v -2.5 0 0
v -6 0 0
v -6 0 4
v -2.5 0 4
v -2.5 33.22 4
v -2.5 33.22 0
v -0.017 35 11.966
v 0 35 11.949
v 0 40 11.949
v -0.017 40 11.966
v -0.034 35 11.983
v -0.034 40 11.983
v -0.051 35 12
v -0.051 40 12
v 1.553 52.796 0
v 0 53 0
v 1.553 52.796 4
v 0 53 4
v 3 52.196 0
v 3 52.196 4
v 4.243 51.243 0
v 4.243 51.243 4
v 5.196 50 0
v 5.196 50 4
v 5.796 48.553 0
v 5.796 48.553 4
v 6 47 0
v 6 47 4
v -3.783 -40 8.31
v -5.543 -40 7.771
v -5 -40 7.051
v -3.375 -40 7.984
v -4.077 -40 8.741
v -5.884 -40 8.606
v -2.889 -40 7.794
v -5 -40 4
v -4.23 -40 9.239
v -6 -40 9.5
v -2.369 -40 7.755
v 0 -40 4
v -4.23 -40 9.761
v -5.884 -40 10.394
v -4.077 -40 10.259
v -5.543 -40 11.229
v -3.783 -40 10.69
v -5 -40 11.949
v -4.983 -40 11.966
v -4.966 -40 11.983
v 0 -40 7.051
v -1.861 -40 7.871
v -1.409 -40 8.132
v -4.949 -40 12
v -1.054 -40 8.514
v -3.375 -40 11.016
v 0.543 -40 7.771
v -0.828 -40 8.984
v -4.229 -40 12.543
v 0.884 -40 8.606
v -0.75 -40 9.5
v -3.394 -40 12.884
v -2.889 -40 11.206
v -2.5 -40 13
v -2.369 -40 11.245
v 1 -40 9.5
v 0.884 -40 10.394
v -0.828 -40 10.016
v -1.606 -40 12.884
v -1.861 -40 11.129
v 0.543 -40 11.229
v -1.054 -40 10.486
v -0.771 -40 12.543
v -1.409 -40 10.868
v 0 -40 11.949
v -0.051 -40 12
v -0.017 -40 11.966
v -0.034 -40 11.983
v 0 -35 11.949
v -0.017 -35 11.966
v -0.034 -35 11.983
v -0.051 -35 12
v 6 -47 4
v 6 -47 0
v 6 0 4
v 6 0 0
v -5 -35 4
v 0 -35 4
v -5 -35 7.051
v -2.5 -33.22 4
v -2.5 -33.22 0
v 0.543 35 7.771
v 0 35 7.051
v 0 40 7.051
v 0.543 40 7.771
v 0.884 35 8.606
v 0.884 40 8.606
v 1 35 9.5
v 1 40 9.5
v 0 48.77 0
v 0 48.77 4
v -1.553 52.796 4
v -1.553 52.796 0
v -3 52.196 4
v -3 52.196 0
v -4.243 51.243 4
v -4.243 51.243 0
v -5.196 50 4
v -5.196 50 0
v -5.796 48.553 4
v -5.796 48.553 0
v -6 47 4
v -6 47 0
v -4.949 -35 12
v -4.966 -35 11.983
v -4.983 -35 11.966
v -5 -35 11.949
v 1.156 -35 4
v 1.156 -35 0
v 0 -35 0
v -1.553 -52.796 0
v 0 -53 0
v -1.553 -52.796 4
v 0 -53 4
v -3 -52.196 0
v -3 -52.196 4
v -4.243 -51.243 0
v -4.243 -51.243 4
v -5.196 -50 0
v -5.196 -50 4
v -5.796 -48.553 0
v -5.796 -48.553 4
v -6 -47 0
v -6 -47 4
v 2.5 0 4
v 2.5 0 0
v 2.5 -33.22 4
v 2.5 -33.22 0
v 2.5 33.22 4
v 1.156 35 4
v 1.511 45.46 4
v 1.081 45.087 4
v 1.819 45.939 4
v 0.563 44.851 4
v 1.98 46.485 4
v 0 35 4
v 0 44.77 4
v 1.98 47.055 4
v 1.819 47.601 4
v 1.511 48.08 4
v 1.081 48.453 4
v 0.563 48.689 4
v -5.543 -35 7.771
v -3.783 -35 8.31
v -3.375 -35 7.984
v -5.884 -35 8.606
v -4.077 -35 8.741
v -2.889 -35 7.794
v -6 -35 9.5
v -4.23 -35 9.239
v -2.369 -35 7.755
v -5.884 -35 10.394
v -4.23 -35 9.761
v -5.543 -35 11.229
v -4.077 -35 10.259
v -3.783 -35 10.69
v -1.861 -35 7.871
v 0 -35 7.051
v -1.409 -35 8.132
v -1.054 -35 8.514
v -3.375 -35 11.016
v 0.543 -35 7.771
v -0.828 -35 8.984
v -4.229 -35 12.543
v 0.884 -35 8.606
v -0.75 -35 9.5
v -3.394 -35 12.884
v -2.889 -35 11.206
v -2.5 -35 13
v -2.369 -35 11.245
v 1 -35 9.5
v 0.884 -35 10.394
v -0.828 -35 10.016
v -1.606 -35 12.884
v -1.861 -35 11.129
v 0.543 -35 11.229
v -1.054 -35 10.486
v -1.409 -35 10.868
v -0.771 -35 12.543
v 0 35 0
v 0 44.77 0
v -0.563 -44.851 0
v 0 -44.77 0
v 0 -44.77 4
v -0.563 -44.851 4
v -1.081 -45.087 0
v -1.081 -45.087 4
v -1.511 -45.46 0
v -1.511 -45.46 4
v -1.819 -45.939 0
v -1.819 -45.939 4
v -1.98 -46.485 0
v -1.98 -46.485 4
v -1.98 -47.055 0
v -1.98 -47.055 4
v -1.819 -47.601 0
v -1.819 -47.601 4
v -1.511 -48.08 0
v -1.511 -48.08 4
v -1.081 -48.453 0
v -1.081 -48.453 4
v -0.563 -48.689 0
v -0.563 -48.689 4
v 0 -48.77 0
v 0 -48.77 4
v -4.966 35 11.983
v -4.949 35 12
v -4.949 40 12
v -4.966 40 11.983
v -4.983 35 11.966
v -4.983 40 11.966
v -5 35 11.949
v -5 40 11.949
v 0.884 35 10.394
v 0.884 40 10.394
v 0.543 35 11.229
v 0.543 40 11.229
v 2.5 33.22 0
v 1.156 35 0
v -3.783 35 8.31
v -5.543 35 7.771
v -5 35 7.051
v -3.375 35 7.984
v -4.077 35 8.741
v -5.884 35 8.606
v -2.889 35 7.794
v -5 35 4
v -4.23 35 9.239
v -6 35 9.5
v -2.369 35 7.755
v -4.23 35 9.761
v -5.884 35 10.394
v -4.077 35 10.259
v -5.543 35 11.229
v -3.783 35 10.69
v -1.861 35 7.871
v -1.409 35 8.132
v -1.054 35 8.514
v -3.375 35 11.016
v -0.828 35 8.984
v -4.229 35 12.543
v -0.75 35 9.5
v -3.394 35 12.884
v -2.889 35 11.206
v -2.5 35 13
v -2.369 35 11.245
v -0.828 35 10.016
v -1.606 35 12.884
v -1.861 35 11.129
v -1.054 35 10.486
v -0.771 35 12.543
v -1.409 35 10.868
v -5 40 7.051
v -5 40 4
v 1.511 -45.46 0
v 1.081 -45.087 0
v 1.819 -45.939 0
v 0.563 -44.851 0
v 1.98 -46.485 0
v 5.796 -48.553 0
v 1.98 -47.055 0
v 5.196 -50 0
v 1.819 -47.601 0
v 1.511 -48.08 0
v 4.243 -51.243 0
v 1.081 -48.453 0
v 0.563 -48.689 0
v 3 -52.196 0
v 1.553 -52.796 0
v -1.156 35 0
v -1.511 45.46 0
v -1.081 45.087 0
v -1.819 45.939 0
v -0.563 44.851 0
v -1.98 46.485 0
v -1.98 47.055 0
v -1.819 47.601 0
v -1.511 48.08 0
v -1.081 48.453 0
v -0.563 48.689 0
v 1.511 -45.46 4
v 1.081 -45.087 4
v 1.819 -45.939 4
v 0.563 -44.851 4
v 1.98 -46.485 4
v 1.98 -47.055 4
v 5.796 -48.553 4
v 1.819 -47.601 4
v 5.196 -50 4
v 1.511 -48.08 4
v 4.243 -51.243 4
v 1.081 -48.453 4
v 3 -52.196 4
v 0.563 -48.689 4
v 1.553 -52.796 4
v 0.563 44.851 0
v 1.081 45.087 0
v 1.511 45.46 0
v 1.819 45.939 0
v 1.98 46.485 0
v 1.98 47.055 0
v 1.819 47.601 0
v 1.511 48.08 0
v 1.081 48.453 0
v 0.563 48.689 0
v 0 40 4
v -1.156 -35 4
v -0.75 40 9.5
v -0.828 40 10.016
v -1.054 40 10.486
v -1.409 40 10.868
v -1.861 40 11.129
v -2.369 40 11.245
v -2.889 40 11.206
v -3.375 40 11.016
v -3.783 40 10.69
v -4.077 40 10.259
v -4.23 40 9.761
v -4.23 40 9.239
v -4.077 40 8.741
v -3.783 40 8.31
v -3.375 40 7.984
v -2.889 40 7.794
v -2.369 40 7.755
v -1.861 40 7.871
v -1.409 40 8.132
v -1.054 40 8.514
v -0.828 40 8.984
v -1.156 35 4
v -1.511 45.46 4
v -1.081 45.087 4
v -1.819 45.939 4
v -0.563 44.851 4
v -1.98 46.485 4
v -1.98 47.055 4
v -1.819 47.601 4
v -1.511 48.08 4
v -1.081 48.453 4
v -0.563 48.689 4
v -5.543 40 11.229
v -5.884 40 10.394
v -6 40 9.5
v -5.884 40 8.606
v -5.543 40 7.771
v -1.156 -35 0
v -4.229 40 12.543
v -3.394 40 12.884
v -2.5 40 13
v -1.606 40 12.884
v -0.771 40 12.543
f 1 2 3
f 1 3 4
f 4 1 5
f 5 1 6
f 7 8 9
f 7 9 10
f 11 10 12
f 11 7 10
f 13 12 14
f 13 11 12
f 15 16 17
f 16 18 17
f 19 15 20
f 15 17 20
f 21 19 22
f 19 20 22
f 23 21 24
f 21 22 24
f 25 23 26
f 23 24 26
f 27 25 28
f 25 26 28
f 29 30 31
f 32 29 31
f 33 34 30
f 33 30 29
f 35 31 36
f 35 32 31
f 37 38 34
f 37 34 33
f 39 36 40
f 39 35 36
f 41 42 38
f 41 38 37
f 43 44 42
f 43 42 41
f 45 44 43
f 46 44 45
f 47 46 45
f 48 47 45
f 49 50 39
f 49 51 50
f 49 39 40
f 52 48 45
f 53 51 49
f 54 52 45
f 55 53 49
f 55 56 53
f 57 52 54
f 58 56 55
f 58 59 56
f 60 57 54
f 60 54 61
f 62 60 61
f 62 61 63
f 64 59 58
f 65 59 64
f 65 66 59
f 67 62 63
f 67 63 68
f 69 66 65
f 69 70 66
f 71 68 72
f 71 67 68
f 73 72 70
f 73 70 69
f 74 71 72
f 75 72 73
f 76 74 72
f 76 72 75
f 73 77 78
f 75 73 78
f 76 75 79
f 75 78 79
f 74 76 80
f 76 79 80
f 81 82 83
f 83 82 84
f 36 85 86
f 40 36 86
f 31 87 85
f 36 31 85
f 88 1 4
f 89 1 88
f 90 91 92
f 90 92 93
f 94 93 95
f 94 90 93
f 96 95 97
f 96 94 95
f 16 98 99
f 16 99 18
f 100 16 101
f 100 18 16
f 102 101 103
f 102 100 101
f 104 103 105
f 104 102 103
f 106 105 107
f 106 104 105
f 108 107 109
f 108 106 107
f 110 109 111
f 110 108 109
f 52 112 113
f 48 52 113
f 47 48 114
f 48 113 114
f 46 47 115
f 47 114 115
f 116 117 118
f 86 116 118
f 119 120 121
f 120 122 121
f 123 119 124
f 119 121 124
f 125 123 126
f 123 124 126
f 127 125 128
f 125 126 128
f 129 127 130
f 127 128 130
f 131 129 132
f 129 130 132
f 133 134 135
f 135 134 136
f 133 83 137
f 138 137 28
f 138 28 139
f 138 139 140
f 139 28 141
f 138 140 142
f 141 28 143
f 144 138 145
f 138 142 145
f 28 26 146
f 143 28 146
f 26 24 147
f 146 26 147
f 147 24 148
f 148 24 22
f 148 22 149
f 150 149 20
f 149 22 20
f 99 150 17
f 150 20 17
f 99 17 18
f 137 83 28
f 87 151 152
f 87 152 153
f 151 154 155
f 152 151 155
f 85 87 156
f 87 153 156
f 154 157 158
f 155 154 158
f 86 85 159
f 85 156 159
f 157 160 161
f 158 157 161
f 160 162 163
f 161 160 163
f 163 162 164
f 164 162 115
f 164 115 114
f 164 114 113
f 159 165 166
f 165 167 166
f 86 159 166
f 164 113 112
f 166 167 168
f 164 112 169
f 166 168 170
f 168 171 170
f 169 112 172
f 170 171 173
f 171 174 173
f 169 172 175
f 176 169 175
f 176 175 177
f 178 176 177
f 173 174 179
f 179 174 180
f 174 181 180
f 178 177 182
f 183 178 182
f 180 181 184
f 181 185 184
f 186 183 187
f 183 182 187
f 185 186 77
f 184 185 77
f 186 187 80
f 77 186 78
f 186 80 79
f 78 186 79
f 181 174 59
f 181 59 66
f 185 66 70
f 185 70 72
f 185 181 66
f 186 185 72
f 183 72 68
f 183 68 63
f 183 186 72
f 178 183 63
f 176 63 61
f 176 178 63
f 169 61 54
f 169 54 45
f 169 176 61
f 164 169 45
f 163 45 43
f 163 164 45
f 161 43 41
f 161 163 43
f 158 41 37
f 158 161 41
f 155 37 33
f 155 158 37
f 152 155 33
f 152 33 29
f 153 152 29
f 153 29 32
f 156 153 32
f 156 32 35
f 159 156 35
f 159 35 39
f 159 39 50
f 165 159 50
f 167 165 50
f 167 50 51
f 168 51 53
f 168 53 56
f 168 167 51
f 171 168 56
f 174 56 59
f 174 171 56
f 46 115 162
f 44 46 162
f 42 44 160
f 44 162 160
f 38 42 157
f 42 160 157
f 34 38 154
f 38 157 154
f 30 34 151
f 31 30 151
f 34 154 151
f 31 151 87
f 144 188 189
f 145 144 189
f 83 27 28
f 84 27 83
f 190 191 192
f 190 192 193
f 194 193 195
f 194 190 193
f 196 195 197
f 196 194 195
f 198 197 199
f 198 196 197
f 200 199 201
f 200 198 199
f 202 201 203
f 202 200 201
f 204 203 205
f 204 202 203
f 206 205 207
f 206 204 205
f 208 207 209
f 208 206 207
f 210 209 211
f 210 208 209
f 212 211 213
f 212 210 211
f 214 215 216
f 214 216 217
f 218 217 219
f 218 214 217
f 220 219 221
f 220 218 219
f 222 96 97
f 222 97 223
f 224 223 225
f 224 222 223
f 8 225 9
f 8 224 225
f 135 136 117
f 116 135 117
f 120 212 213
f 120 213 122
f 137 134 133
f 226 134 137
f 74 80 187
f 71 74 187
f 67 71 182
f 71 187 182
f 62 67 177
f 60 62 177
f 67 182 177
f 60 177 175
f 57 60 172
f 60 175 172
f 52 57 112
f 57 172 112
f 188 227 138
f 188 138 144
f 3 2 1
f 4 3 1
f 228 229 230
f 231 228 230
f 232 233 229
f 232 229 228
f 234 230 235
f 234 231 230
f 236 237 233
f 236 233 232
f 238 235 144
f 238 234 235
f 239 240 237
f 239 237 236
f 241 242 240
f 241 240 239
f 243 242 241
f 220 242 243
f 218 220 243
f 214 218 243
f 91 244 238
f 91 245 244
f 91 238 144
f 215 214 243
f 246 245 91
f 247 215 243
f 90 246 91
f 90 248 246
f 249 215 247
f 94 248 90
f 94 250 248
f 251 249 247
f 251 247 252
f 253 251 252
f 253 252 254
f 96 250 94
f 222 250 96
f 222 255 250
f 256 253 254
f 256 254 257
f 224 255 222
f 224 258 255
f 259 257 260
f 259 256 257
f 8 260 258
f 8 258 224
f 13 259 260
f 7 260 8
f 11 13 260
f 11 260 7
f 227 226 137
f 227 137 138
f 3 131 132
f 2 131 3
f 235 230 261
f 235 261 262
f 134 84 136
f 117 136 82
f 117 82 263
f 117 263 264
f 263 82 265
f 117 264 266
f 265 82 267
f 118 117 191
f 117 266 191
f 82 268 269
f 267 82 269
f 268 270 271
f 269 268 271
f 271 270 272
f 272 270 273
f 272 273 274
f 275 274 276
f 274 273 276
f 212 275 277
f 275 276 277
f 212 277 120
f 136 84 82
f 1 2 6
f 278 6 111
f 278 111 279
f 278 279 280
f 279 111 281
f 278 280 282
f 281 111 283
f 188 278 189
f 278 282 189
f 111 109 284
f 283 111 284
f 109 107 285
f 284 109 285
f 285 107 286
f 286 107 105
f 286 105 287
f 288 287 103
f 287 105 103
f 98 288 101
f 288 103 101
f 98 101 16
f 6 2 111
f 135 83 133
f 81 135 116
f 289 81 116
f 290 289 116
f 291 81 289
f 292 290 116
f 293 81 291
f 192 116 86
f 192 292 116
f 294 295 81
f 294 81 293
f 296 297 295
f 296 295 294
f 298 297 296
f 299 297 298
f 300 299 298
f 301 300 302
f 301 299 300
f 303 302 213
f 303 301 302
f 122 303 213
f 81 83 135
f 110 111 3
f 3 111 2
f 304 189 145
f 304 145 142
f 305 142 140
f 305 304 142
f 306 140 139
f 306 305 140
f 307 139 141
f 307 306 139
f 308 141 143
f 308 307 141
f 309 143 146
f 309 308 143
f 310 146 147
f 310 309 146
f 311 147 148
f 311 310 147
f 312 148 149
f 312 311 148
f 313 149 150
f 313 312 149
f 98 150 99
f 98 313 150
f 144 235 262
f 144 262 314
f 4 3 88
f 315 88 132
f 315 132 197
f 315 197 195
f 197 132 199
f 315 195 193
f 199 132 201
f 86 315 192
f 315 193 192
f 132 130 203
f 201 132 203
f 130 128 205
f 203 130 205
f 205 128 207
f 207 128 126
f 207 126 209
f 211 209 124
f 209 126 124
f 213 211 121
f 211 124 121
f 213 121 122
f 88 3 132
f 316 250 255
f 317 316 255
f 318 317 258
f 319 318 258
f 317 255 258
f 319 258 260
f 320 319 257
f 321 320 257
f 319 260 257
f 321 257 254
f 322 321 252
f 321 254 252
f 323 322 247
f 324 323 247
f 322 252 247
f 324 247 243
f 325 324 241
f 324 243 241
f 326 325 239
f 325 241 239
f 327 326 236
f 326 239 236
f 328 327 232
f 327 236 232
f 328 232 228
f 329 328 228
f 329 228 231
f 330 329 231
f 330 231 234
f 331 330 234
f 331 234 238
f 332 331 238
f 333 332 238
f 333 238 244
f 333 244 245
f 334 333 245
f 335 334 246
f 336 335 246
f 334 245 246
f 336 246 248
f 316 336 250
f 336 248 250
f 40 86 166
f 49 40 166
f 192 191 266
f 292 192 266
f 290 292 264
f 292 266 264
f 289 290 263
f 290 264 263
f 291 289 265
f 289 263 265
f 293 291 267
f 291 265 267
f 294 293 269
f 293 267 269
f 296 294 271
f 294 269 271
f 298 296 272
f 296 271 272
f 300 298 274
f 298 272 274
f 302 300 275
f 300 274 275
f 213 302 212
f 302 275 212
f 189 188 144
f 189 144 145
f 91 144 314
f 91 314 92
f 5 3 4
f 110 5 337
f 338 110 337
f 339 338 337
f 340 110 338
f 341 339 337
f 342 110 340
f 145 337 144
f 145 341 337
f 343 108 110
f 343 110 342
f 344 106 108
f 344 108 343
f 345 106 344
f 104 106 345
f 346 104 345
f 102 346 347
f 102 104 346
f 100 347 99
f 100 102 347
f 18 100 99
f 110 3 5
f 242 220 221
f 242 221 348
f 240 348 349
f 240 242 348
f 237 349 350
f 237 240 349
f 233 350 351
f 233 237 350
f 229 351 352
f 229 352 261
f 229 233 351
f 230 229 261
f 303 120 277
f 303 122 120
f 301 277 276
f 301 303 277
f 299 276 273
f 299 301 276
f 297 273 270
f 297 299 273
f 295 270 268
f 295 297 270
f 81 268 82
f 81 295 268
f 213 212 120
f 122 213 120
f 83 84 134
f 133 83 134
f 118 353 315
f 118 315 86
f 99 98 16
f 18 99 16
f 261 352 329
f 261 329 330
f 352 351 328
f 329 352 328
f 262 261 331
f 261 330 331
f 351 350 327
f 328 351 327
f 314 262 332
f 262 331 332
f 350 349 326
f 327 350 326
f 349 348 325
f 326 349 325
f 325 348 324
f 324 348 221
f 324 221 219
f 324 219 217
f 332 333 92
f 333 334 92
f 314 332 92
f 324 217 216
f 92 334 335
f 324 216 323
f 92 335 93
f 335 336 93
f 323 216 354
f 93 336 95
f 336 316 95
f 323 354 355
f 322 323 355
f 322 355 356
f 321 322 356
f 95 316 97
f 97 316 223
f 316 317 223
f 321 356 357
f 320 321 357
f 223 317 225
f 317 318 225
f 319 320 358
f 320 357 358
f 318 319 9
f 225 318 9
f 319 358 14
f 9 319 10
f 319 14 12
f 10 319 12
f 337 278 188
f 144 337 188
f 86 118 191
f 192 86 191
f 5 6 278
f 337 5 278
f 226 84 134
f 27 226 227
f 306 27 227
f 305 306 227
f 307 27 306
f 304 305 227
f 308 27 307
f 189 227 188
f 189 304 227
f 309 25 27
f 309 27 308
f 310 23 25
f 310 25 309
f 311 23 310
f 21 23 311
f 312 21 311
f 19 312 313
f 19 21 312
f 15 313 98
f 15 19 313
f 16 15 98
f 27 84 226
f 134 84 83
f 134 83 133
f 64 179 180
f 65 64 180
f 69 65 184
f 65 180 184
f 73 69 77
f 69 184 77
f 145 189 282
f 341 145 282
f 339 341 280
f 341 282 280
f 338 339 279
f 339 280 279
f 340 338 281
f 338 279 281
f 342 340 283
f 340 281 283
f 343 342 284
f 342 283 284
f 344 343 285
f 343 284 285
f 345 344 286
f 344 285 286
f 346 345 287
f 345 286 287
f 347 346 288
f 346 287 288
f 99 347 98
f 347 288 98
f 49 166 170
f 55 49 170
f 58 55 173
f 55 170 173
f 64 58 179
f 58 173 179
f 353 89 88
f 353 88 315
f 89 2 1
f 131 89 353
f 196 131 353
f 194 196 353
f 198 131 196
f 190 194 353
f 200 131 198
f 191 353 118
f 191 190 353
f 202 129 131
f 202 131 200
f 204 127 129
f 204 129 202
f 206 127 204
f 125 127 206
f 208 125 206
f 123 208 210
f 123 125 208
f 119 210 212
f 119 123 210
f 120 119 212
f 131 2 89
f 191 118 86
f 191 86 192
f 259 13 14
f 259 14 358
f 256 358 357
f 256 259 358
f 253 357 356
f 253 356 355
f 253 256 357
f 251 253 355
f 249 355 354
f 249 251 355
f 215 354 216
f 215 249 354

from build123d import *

# Parameters (mm, degrees)
F1_DEPTH = 4
F3_START = -35
F2_R     = 1.75
F3_DEPTH = 5
F6_R     = 5.99999
F6_2_R   = 5.99999
F6_3_R   = 5.99999
F6_4_R   = 5.99999


# Not quite as in the source:
# - a fillet or chamfer is up to 0.001 mm smaller than in the source, because OpenCascade refuses the exact size


with BuildPart() as f1:
    # F0 (on Top) → F1 (new body)
    with BuildSketch(Plane.XY):
        with BuildLine():
            Line((-6, 0), (-2.5, 0))
            Line((-2.5, 0), (-2.5, 33.2198664546))
            Line((-2.5, 33.2198664546), (-1.1564682936, 35))
            Line((-1.1564682936, 35), (0, 35))
            Line((0, 35), (0, 44.77))
            ThreePointArc((0, 44.77), (-2, 46.77), (0, 48.77))
            Line((0, 48.77), (0, 53))
            Line((0, 53), (-6, 53))
            Line((-6, 53), (-6, 0))
        make_face()
    extrude(amount=F1_DEPTH)


with BuildPart() as f3:
    # F2 (on Front) → F3 (new body)
    with BuildSketch(Plane.XZ.offset(F3_START)):
        with BuildLine():
            ThreePointArc((-5, 7.0505102572), (-2.5, 6), (0, 7.0505102572))
            Line((0, 7.0505102572), (0, 11.9494897428))
            ThreePointArc((0, 11.9494897428), (-0.0251262658, 11.9748737342), (-0.0505102572, 12))
            Line((-0.0505102572, 12), (-4.9494897428, 12))
            ThreePointArc((-4.9494897428, 12), (-4.9748737342, 11.9748737342), (-5, 11.9494897428))
            Line((-5, 11.9494897428), (-5, 7.0505102572))
        make_face()
        with Locations((-2.5, 9.5)):
            Circle(F2_R, mode=Mode.SUBTRACT)
        with BuildLine():
            Line((-5, 4), (0, 4))
            Line((0, 4), (0, 7.0505102572))
            ThreePointArc((0, 7.0505102572), (-2.5, 6), (-5, 7.0505102572))
            Line((-5, 7.0505102572), (-5, 4))
        make_face()
        with BuildLine():
            Line((0, 11.9494897428), (0, 7.0505102572))
            ThreePointArc((0, 7.0505102572), (0.7403703492, 8.1771243445), (1, 9.5))
            ThreePointArc((1, 9.5), (0.7403703492, 10.8228756555), (0, 11.9494897428))
        make_face()
        with BuildLine():
            Line((-4.9494897428, 12), (-0.0505102572, 12))
            ThreePointArc((-0.0505102572, 12), (-2.5, 13), (-4.9494897428, 12))
        make_face()
        with BuildLine():
            ThreePointArc((-5, 11.9494897428), (-6, 9.5), (-5, 7.0505102572))
            Line((-5, 7.0505102572), (-5, 11.9494897428))
        make_face()
    extrude(amount=-F3_DEPTH)


with BuildPart() as f4_1:
    # F4: instance of F1
    add(f1.part.mirror(Plane(origin=(-4.25, 0, 2), x_dir=(1, 0, 0), z_dir=(0, -1, 0))))


with BuildPart() as f4_2:
    # F4: instance of F3
    add(f3.part.mirror(Plane(origin=(-4.25, 0, 2), x_dir=(1, 0, 0), z_dir=(0, -1, 0))))


with BuildPart() as f5_1:
    # F5: instance of F1
    add(f1.part.mirror(Plane(origin=(0, -39.885, 2), x_dir=(0, 1, 0), z_dir=(1, 0, 0))))

    # F6#3 (radius 6 in the source; OpenCascade refuses exactly that, so slightly less here)
    f6_3_edges = [f5_1.edges().sort_by_distance(p)[0] for p in [
        (6, 53, 2),
    ]]
    fillet(f6_3_edges, radius=F6_3_R)


with BuildPart() as f5_2:
    # F5: instance of F4_1
    add(f4_1.part.mirror(Plane(origin=(0, -39.885, 2), x_dir=(0, 1, 0), z_dir=(1, 0, 0))))

    # F6 (radius 6 in the source; OpenCascade refuses exactly that, so slightly less here)
    f6_edges = [f5_2.edges().sort_by_distance(p)[0] for p in [
        (6, -53, 2),
    ]]
    fillet(f6_edges, radius=F6_R)


with BuildPart() as f4_1_1:
    add(f4_1.part)

    # F6#2 (radius 6 in the source; OpenCascade refuses exactly that, so slightly less here)
    f6_2_edges = [f4_1_1.edges().sort_by_distance(p)[0] for p in [
        (-6, -53, 2),
    ]]
    fillet(f6_2_edges, radius=F6_2_R)


with BuildPart() as f1_1:
    add(f1.part)

    # F6#4 (radius 6 in the source; OpenCascade refuses exactly that, so slightly less here)
    f6_4_edges = [f1_1.edges().sort_by_distance(p)[0] for p in [
        (-6, 53, 2),
    ]]
    fillet(f6_4_edges, radius=F6_4_R)


solid = Compound([f3.part, f4_2.part, f5_1.part, f5_2.part, f4_1_1.part, f1_1.part])
